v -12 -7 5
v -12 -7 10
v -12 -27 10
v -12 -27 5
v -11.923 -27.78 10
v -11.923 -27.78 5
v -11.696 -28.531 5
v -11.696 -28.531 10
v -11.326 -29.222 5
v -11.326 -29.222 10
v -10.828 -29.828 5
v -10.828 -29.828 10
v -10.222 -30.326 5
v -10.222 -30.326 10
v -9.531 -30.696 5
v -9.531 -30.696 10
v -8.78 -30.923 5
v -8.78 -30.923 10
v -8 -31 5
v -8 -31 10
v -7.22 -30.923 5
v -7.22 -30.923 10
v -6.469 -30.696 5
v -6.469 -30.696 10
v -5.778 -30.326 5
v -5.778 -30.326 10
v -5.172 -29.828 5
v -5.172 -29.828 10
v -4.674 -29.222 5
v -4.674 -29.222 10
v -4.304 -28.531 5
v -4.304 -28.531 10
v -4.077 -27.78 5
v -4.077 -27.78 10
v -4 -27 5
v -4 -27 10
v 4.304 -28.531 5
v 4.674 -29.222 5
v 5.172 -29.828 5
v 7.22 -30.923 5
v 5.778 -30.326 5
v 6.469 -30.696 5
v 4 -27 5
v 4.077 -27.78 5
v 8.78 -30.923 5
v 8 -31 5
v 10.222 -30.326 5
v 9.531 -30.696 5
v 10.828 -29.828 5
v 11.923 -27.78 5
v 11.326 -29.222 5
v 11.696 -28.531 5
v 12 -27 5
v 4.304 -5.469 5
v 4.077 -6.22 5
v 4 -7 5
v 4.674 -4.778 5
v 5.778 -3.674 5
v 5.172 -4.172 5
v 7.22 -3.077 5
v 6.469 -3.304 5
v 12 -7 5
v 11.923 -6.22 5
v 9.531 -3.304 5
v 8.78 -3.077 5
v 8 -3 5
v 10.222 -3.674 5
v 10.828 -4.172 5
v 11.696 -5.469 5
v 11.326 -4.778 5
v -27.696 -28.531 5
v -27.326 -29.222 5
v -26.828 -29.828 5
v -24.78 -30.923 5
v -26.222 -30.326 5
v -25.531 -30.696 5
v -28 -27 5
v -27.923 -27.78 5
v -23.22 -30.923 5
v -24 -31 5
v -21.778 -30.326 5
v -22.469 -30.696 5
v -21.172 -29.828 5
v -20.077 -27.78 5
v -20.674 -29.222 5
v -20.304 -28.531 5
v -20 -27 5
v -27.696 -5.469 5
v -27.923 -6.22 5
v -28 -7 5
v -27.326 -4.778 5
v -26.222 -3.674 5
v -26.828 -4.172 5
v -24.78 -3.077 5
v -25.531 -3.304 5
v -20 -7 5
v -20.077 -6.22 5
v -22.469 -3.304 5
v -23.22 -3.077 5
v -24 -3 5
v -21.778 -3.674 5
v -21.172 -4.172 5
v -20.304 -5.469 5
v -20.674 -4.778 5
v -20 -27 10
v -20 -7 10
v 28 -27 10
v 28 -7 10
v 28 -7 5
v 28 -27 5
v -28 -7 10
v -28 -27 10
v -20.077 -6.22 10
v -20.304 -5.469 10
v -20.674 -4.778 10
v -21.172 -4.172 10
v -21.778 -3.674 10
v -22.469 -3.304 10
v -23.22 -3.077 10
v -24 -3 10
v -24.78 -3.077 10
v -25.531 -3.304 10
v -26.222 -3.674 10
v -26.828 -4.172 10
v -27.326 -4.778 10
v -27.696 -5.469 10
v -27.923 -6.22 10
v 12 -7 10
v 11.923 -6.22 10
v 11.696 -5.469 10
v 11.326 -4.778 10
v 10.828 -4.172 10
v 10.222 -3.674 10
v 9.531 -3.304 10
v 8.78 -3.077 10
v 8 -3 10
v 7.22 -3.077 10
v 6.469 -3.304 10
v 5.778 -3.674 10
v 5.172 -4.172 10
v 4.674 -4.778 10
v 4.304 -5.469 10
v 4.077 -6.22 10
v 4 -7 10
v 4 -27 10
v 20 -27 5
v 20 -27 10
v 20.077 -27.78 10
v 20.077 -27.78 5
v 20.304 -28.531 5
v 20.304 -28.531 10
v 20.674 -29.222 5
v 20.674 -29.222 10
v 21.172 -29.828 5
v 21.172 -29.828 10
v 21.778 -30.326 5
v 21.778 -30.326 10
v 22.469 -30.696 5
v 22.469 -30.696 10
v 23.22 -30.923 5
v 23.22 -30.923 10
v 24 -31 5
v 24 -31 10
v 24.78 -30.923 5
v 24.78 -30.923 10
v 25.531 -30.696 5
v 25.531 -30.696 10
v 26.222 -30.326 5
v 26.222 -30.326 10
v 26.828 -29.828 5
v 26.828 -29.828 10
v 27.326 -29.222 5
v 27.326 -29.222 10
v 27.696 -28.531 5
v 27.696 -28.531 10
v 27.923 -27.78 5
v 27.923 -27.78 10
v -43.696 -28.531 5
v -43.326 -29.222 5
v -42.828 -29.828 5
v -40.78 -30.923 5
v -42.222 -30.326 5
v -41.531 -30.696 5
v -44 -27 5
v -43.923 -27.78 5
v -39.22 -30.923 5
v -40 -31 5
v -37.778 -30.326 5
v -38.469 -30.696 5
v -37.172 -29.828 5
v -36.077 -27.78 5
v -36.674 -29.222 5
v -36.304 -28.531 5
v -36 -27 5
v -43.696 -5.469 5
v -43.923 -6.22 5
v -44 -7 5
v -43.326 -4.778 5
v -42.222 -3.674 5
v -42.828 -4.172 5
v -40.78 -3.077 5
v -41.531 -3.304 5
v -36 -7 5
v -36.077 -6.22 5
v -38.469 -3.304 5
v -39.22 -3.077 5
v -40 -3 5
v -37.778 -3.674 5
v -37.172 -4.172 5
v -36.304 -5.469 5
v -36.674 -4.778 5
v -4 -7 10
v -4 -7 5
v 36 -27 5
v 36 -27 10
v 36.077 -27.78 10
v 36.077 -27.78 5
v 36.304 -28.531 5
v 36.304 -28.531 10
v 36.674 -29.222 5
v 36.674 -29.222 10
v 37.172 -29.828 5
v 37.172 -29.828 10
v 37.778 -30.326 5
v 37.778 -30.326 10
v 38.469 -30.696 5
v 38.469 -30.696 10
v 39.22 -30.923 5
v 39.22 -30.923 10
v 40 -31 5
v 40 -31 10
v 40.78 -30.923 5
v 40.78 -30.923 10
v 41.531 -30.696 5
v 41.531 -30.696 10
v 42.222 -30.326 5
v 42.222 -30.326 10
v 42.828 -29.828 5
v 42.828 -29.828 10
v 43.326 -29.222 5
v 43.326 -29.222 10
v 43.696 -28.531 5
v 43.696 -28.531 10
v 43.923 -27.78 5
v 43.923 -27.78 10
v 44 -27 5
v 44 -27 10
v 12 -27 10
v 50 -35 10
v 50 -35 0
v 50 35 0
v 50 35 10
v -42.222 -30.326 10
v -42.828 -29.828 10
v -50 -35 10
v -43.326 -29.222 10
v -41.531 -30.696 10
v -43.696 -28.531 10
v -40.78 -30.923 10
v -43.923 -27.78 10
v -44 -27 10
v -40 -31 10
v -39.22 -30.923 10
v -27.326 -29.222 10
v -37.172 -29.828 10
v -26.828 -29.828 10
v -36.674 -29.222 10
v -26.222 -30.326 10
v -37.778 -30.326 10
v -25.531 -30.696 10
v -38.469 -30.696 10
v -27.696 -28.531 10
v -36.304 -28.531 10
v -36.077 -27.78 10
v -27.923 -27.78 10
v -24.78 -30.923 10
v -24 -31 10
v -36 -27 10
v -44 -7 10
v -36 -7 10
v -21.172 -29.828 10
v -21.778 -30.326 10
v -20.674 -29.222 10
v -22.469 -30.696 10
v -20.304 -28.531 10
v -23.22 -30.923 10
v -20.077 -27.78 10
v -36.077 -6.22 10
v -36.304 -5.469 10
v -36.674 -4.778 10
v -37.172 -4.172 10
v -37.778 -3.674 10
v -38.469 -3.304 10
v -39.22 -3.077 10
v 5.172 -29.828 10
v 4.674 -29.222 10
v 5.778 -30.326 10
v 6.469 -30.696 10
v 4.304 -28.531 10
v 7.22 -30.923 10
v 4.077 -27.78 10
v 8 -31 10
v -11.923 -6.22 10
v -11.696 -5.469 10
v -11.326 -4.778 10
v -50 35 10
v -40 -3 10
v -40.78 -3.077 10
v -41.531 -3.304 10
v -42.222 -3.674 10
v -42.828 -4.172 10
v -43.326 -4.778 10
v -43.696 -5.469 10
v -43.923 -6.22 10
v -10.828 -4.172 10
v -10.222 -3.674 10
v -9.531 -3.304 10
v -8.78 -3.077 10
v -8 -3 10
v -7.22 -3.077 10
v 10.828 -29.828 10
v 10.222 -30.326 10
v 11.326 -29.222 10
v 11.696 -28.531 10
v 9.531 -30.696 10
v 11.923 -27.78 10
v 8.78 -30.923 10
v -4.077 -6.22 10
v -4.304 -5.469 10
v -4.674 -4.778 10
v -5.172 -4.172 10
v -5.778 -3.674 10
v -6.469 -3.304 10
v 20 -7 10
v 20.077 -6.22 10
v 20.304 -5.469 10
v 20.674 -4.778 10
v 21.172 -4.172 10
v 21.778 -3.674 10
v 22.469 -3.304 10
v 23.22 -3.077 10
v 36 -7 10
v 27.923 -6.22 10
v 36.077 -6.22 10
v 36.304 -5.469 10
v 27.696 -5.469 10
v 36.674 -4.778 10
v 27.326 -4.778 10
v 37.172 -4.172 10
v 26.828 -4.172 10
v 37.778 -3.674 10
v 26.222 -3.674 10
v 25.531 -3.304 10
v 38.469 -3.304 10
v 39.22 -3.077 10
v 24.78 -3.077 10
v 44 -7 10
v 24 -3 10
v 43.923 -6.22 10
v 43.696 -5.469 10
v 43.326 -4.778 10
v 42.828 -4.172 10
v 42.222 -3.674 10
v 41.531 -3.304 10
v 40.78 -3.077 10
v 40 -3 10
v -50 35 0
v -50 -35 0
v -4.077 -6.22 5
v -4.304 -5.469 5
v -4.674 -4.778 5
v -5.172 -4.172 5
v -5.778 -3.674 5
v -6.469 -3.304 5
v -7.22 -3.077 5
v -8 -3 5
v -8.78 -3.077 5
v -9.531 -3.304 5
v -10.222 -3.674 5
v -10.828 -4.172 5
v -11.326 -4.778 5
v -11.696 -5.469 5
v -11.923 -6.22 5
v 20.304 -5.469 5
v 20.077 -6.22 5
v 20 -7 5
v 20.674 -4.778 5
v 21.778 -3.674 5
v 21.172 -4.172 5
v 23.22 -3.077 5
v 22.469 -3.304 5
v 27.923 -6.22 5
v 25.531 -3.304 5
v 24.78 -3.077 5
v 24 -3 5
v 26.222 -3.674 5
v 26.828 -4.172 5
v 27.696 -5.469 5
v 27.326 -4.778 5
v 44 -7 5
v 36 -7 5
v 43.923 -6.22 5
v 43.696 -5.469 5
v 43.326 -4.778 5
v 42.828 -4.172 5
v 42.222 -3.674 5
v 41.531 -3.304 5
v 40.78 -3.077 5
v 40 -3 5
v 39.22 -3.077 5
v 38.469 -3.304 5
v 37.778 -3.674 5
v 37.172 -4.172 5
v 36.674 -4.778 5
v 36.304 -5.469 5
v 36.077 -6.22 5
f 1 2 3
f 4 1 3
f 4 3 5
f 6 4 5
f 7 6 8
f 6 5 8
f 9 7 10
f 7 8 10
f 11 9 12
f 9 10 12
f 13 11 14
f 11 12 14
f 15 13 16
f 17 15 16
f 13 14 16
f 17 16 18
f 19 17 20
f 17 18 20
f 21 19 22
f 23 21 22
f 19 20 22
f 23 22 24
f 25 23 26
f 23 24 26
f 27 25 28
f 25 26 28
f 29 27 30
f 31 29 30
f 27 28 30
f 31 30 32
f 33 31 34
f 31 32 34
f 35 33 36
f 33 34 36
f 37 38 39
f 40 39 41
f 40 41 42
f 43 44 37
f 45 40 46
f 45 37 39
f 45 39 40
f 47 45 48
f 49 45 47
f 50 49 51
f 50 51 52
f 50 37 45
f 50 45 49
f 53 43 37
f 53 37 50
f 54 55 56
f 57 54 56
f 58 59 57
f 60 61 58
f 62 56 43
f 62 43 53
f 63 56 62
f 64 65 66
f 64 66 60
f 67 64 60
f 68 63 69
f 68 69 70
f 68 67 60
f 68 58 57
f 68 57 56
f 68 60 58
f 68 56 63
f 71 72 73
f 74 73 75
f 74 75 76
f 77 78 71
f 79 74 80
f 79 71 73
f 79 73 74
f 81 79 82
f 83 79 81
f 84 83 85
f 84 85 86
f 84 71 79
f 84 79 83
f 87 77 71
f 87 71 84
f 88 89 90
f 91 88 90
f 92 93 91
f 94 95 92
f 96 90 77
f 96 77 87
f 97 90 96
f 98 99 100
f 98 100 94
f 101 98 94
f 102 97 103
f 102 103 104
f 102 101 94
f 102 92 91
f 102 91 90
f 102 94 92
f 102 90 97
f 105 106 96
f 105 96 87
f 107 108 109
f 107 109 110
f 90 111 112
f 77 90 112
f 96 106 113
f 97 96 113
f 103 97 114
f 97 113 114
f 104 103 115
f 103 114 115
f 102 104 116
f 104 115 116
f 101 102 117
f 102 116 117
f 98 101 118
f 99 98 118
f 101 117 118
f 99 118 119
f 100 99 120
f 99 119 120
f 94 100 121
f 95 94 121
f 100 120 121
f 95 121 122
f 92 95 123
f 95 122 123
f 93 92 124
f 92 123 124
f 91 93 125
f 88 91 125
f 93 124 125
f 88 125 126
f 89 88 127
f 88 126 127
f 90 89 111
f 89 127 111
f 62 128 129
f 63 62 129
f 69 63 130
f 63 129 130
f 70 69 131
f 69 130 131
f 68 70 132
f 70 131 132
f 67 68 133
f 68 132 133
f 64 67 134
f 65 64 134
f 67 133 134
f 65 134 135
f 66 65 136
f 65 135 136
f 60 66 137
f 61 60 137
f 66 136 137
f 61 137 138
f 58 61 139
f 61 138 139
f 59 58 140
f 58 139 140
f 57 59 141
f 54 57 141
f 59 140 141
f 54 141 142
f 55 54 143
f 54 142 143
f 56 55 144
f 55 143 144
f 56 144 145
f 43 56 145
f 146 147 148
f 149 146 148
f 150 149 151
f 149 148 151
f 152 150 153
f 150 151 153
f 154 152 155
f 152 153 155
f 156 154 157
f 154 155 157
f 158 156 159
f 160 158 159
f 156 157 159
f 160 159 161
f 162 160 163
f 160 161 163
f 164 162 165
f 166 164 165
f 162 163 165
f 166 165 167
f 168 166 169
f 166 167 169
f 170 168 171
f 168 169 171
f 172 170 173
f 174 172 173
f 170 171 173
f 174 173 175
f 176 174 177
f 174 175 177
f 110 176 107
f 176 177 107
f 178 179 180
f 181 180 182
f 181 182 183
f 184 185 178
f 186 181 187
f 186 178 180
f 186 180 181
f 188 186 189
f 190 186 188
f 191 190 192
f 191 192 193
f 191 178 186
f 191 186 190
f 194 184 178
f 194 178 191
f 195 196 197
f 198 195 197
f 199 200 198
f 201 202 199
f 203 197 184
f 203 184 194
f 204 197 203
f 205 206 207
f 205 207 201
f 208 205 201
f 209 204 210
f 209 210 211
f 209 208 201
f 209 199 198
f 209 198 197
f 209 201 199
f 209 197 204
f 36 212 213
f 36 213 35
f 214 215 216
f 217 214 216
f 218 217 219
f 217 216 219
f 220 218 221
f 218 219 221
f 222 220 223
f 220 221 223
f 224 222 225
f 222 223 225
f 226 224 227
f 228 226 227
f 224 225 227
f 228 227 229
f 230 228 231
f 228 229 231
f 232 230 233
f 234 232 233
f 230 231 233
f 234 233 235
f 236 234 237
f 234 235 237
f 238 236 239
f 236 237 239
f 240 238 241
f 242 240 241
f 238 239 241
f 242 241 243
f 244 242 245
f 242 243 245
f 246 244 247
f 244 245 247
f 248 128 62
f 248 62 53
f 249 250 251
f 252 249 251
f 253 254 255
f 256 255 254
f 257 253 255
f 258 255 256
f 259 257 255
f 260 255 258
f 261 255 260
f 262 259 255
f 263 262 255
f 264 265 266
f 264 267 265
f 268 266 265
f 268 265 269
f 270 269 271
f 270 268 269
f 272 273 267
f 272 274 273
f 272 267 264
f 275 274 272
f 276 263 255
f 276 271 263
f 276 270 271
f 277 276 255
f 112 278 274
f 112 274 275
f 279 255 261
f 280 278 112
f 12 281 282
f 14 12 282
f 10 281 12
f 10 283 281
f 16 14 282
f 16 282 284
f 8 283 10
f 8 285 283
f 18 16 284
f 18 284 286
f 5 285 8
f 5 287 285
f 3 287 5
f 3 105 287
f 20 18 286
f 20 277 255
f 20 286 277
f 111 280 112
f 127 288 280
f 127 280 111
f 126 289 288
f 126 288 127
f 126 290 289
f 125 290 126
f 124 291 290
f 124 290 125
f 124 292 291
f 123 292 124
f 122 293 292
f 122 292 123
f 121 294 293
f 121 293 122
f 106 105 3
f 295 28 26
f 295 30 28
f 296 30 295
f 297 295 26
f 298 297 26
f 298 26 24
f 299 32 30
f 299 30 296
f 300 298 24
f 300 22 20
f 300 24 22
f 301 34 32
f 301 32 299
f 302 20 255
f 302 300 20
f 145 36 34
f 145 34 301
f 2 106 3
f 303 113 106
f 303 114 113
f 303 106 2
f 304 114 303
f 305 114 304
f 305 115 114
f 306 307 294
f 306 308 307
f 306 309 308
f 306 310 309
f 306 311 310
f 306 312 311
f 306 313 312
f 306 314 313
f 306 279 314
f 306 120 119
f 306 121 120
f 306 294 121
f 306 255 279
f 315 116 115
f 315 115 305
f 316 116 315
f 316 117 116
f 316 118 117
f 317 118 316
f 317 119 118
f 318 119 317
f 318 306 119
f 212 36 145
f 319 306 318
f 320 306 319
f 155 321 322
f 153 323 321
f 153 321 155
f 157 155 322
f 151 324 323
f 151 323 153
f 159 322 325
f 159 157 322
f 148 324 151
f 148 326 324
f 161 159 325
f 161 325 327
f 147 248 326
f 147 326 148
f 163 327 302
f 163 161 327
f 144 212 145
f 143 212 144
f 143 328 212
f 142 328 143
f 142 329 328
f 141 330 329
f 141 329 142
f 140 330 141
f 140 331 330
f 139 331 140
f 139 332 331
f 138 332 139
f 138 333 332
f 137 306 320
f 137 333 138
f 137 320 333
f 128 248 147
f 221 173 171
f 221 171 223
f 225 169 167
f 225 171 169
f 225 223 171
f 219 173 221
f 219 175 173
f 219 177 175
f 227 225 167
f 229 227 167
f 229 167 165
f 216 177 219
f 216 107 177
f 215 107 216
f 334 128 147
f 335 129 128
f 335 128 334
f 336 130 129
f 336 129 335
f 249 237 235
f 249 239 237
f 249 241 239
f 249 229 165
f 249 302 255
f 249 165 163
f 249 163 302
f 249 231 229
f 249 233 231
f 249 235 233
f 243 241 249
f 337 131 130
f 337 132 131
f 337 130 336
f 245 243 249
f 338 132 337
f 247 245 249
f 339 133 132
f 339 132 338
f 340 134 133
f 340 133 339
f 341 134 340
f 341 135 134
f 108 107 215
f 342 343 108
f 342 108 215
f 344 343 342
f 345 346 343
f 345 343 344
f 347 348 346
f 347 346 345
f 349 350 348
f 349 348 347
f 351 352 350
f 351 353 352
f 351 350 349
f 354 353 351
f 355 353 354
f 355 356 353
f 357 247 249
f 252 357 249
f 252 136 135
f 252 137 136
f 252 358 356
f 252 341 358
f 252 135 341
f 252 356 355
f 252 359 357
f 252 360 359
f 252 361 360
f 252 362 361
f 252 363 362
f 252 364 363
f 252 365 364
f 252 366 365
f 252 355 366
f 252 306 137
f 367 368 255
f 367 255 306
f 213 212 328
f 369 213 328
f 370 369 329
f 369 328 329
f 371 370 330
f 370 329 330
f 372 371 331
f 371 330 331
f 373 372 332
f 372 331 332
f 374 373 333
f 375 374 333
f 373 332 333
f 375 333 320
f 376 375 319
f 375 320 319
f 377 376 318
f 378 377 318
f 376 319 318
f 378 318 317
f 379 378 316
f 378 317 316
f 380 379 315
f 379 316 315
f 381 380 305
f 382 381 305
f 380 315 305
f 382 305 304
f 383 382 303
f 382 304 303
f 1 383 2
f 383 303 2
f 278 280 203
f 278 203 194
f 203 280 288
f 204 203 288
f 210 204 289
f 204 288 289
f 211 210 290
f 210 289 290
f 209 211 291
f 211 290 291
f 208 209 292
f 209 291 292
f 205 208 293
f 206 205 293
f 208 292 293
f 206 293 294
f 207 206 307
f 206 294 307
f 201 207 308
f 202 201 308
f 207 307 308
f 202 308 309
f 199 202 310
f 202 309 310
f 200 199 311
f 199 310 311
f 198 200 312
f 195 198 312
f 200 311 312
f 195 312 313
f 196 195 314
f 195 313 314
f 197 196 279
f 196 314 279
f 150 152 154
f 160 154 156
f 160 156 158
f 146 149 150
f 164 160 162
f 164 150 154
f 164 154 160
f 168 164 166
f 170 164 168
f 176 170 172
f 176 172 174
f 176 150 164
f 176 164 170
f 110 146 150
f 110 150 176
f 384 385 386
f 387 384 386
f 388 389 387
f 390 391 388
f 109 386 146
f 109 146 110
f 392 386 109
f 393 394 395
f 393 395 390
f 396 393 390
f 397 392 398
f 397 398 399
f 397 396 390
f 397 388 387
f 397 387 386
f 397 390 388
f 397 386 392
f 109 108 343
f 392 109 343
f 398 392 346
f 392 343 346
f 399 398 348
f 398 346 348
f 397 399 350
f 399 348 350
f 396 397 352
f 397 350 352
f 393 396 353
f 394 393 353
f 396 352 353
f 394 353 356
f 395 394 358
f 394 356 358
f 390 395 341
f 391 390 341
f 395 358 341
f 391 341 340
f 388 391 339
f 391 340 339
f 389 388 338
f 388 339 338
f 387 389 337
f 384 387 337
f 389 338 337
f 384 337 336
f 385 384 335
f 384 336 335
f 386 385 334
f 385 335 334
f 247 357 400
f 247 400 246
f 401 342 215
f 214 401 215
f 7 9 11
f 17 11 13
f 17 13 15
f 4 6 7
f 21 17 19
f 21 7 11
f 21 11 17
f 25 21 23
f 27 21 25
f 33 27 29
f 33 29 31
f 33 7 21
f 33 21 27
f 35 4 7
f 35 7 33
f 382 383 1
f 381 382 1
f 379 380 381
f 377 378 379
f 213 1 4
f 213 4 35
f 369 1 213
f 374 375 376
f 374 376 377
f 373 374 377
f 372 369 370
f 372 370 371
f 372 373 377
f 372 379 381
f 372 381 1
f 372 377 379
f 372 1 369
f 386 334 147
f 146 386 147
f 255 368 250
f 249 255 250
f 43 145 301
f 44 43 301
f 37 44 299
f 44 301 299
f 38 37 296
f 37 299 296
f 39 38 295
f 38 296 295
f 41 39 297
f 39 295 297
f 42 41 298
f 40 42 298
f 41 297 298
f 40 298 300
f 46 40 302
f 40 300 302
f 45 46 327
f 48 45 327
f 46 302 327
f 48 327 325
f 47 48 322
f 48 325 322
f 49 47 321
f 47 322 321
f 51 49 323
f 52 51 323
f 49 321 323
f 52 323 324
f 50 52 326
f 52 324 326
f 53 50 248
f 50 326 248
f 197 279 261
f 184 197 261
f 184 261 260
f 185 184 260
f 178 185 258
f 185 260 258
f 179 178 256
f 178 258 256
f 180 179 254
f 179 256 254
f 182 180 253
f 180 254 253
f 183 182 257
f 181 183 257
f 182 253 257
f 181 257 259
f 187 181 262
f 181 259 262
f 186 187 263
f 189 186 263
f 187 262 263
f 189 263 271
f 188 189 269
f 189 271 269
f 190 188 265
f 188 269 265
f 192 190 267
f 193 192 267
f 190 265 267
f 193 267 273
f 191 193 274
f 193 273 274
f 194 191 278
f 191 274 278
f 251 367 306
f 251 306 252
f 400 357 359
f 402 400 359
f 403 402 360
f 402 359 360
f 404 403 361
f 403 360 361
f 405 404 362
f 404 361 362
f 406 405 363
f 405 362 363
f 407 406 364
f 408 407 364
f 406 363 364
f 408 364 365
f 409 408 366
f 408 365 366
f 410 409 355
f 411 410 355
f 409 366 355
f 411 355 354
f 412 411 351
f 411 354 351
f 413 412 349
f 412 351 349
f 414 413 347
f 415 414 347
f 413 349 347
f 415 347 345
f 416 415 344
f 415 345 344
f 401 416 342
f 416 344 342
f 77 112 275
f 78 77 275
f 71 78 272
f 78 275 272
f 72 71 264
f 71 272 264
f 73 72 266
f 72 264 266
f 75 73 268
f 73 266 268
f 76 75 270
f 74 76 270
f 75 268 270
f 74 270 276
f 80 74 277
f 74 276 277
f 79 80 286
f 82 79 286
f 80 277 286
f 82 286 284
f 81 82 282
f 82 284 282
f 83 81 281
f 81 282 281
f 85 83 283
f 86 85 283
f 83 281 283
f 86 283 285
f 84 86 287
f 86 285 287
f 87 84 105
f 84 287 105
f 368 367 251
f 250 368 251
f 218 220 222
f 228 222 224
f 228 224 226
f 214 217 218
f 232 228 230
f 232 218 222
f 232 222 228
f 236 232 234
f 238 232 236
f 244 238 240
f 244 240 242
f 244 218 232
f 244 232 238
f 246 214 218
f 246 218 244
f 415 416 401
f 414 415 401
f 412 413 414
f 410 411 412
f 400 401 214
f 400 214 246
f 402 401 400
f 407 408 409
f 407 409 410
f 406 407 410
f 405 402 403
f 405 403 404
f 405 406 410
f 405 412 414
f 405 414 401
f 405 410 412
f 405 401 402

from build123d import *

# Parameters (mm, degrees)
SKETCH_W            = 100
SKETCH_H            = 70
PAD_DEPTH           = 10
POCKET_DEPTH        = 5
LINEARPATTERN_COUNT = 6
LINEARPATTERN_PITCH = 16


with BuildPart() as part:
    # Sketch → Pad (new body)
    with BuildSketch(Plane.XY):
        Rectangle(SKETCH_W, SKETCH_H)
    extrude(amount=PAD_DEPTH)

    # Sketch001 (on Face6 of Pad) → Pocket (cut)
    with BuildSketch(Plane.XY.offset(10)):
        with BuildLine():
            ThreePointArc((-36, -7), (-40, -3), (-44, -7))
            Line((-44, -7), (-44, -27))
            ThreePointArc((-44, -27), (-40, -31), (-36, -27))
            Line((-36, -7), (-36, -27))
        make_face()
    pocket = extrude(amount=-POCKET_DEPTH, mode=Mode.SUBTRACT)

    # LinearPattern: Pocket ×6
    with Locations(*[(i * LINEARPATTERN_PITCH, 0, 0) for i in range(1, LINEARPATTERN_COUNT)]):
        add(pocket, mode=Mode.SUBTRACT)


solid = part.part
